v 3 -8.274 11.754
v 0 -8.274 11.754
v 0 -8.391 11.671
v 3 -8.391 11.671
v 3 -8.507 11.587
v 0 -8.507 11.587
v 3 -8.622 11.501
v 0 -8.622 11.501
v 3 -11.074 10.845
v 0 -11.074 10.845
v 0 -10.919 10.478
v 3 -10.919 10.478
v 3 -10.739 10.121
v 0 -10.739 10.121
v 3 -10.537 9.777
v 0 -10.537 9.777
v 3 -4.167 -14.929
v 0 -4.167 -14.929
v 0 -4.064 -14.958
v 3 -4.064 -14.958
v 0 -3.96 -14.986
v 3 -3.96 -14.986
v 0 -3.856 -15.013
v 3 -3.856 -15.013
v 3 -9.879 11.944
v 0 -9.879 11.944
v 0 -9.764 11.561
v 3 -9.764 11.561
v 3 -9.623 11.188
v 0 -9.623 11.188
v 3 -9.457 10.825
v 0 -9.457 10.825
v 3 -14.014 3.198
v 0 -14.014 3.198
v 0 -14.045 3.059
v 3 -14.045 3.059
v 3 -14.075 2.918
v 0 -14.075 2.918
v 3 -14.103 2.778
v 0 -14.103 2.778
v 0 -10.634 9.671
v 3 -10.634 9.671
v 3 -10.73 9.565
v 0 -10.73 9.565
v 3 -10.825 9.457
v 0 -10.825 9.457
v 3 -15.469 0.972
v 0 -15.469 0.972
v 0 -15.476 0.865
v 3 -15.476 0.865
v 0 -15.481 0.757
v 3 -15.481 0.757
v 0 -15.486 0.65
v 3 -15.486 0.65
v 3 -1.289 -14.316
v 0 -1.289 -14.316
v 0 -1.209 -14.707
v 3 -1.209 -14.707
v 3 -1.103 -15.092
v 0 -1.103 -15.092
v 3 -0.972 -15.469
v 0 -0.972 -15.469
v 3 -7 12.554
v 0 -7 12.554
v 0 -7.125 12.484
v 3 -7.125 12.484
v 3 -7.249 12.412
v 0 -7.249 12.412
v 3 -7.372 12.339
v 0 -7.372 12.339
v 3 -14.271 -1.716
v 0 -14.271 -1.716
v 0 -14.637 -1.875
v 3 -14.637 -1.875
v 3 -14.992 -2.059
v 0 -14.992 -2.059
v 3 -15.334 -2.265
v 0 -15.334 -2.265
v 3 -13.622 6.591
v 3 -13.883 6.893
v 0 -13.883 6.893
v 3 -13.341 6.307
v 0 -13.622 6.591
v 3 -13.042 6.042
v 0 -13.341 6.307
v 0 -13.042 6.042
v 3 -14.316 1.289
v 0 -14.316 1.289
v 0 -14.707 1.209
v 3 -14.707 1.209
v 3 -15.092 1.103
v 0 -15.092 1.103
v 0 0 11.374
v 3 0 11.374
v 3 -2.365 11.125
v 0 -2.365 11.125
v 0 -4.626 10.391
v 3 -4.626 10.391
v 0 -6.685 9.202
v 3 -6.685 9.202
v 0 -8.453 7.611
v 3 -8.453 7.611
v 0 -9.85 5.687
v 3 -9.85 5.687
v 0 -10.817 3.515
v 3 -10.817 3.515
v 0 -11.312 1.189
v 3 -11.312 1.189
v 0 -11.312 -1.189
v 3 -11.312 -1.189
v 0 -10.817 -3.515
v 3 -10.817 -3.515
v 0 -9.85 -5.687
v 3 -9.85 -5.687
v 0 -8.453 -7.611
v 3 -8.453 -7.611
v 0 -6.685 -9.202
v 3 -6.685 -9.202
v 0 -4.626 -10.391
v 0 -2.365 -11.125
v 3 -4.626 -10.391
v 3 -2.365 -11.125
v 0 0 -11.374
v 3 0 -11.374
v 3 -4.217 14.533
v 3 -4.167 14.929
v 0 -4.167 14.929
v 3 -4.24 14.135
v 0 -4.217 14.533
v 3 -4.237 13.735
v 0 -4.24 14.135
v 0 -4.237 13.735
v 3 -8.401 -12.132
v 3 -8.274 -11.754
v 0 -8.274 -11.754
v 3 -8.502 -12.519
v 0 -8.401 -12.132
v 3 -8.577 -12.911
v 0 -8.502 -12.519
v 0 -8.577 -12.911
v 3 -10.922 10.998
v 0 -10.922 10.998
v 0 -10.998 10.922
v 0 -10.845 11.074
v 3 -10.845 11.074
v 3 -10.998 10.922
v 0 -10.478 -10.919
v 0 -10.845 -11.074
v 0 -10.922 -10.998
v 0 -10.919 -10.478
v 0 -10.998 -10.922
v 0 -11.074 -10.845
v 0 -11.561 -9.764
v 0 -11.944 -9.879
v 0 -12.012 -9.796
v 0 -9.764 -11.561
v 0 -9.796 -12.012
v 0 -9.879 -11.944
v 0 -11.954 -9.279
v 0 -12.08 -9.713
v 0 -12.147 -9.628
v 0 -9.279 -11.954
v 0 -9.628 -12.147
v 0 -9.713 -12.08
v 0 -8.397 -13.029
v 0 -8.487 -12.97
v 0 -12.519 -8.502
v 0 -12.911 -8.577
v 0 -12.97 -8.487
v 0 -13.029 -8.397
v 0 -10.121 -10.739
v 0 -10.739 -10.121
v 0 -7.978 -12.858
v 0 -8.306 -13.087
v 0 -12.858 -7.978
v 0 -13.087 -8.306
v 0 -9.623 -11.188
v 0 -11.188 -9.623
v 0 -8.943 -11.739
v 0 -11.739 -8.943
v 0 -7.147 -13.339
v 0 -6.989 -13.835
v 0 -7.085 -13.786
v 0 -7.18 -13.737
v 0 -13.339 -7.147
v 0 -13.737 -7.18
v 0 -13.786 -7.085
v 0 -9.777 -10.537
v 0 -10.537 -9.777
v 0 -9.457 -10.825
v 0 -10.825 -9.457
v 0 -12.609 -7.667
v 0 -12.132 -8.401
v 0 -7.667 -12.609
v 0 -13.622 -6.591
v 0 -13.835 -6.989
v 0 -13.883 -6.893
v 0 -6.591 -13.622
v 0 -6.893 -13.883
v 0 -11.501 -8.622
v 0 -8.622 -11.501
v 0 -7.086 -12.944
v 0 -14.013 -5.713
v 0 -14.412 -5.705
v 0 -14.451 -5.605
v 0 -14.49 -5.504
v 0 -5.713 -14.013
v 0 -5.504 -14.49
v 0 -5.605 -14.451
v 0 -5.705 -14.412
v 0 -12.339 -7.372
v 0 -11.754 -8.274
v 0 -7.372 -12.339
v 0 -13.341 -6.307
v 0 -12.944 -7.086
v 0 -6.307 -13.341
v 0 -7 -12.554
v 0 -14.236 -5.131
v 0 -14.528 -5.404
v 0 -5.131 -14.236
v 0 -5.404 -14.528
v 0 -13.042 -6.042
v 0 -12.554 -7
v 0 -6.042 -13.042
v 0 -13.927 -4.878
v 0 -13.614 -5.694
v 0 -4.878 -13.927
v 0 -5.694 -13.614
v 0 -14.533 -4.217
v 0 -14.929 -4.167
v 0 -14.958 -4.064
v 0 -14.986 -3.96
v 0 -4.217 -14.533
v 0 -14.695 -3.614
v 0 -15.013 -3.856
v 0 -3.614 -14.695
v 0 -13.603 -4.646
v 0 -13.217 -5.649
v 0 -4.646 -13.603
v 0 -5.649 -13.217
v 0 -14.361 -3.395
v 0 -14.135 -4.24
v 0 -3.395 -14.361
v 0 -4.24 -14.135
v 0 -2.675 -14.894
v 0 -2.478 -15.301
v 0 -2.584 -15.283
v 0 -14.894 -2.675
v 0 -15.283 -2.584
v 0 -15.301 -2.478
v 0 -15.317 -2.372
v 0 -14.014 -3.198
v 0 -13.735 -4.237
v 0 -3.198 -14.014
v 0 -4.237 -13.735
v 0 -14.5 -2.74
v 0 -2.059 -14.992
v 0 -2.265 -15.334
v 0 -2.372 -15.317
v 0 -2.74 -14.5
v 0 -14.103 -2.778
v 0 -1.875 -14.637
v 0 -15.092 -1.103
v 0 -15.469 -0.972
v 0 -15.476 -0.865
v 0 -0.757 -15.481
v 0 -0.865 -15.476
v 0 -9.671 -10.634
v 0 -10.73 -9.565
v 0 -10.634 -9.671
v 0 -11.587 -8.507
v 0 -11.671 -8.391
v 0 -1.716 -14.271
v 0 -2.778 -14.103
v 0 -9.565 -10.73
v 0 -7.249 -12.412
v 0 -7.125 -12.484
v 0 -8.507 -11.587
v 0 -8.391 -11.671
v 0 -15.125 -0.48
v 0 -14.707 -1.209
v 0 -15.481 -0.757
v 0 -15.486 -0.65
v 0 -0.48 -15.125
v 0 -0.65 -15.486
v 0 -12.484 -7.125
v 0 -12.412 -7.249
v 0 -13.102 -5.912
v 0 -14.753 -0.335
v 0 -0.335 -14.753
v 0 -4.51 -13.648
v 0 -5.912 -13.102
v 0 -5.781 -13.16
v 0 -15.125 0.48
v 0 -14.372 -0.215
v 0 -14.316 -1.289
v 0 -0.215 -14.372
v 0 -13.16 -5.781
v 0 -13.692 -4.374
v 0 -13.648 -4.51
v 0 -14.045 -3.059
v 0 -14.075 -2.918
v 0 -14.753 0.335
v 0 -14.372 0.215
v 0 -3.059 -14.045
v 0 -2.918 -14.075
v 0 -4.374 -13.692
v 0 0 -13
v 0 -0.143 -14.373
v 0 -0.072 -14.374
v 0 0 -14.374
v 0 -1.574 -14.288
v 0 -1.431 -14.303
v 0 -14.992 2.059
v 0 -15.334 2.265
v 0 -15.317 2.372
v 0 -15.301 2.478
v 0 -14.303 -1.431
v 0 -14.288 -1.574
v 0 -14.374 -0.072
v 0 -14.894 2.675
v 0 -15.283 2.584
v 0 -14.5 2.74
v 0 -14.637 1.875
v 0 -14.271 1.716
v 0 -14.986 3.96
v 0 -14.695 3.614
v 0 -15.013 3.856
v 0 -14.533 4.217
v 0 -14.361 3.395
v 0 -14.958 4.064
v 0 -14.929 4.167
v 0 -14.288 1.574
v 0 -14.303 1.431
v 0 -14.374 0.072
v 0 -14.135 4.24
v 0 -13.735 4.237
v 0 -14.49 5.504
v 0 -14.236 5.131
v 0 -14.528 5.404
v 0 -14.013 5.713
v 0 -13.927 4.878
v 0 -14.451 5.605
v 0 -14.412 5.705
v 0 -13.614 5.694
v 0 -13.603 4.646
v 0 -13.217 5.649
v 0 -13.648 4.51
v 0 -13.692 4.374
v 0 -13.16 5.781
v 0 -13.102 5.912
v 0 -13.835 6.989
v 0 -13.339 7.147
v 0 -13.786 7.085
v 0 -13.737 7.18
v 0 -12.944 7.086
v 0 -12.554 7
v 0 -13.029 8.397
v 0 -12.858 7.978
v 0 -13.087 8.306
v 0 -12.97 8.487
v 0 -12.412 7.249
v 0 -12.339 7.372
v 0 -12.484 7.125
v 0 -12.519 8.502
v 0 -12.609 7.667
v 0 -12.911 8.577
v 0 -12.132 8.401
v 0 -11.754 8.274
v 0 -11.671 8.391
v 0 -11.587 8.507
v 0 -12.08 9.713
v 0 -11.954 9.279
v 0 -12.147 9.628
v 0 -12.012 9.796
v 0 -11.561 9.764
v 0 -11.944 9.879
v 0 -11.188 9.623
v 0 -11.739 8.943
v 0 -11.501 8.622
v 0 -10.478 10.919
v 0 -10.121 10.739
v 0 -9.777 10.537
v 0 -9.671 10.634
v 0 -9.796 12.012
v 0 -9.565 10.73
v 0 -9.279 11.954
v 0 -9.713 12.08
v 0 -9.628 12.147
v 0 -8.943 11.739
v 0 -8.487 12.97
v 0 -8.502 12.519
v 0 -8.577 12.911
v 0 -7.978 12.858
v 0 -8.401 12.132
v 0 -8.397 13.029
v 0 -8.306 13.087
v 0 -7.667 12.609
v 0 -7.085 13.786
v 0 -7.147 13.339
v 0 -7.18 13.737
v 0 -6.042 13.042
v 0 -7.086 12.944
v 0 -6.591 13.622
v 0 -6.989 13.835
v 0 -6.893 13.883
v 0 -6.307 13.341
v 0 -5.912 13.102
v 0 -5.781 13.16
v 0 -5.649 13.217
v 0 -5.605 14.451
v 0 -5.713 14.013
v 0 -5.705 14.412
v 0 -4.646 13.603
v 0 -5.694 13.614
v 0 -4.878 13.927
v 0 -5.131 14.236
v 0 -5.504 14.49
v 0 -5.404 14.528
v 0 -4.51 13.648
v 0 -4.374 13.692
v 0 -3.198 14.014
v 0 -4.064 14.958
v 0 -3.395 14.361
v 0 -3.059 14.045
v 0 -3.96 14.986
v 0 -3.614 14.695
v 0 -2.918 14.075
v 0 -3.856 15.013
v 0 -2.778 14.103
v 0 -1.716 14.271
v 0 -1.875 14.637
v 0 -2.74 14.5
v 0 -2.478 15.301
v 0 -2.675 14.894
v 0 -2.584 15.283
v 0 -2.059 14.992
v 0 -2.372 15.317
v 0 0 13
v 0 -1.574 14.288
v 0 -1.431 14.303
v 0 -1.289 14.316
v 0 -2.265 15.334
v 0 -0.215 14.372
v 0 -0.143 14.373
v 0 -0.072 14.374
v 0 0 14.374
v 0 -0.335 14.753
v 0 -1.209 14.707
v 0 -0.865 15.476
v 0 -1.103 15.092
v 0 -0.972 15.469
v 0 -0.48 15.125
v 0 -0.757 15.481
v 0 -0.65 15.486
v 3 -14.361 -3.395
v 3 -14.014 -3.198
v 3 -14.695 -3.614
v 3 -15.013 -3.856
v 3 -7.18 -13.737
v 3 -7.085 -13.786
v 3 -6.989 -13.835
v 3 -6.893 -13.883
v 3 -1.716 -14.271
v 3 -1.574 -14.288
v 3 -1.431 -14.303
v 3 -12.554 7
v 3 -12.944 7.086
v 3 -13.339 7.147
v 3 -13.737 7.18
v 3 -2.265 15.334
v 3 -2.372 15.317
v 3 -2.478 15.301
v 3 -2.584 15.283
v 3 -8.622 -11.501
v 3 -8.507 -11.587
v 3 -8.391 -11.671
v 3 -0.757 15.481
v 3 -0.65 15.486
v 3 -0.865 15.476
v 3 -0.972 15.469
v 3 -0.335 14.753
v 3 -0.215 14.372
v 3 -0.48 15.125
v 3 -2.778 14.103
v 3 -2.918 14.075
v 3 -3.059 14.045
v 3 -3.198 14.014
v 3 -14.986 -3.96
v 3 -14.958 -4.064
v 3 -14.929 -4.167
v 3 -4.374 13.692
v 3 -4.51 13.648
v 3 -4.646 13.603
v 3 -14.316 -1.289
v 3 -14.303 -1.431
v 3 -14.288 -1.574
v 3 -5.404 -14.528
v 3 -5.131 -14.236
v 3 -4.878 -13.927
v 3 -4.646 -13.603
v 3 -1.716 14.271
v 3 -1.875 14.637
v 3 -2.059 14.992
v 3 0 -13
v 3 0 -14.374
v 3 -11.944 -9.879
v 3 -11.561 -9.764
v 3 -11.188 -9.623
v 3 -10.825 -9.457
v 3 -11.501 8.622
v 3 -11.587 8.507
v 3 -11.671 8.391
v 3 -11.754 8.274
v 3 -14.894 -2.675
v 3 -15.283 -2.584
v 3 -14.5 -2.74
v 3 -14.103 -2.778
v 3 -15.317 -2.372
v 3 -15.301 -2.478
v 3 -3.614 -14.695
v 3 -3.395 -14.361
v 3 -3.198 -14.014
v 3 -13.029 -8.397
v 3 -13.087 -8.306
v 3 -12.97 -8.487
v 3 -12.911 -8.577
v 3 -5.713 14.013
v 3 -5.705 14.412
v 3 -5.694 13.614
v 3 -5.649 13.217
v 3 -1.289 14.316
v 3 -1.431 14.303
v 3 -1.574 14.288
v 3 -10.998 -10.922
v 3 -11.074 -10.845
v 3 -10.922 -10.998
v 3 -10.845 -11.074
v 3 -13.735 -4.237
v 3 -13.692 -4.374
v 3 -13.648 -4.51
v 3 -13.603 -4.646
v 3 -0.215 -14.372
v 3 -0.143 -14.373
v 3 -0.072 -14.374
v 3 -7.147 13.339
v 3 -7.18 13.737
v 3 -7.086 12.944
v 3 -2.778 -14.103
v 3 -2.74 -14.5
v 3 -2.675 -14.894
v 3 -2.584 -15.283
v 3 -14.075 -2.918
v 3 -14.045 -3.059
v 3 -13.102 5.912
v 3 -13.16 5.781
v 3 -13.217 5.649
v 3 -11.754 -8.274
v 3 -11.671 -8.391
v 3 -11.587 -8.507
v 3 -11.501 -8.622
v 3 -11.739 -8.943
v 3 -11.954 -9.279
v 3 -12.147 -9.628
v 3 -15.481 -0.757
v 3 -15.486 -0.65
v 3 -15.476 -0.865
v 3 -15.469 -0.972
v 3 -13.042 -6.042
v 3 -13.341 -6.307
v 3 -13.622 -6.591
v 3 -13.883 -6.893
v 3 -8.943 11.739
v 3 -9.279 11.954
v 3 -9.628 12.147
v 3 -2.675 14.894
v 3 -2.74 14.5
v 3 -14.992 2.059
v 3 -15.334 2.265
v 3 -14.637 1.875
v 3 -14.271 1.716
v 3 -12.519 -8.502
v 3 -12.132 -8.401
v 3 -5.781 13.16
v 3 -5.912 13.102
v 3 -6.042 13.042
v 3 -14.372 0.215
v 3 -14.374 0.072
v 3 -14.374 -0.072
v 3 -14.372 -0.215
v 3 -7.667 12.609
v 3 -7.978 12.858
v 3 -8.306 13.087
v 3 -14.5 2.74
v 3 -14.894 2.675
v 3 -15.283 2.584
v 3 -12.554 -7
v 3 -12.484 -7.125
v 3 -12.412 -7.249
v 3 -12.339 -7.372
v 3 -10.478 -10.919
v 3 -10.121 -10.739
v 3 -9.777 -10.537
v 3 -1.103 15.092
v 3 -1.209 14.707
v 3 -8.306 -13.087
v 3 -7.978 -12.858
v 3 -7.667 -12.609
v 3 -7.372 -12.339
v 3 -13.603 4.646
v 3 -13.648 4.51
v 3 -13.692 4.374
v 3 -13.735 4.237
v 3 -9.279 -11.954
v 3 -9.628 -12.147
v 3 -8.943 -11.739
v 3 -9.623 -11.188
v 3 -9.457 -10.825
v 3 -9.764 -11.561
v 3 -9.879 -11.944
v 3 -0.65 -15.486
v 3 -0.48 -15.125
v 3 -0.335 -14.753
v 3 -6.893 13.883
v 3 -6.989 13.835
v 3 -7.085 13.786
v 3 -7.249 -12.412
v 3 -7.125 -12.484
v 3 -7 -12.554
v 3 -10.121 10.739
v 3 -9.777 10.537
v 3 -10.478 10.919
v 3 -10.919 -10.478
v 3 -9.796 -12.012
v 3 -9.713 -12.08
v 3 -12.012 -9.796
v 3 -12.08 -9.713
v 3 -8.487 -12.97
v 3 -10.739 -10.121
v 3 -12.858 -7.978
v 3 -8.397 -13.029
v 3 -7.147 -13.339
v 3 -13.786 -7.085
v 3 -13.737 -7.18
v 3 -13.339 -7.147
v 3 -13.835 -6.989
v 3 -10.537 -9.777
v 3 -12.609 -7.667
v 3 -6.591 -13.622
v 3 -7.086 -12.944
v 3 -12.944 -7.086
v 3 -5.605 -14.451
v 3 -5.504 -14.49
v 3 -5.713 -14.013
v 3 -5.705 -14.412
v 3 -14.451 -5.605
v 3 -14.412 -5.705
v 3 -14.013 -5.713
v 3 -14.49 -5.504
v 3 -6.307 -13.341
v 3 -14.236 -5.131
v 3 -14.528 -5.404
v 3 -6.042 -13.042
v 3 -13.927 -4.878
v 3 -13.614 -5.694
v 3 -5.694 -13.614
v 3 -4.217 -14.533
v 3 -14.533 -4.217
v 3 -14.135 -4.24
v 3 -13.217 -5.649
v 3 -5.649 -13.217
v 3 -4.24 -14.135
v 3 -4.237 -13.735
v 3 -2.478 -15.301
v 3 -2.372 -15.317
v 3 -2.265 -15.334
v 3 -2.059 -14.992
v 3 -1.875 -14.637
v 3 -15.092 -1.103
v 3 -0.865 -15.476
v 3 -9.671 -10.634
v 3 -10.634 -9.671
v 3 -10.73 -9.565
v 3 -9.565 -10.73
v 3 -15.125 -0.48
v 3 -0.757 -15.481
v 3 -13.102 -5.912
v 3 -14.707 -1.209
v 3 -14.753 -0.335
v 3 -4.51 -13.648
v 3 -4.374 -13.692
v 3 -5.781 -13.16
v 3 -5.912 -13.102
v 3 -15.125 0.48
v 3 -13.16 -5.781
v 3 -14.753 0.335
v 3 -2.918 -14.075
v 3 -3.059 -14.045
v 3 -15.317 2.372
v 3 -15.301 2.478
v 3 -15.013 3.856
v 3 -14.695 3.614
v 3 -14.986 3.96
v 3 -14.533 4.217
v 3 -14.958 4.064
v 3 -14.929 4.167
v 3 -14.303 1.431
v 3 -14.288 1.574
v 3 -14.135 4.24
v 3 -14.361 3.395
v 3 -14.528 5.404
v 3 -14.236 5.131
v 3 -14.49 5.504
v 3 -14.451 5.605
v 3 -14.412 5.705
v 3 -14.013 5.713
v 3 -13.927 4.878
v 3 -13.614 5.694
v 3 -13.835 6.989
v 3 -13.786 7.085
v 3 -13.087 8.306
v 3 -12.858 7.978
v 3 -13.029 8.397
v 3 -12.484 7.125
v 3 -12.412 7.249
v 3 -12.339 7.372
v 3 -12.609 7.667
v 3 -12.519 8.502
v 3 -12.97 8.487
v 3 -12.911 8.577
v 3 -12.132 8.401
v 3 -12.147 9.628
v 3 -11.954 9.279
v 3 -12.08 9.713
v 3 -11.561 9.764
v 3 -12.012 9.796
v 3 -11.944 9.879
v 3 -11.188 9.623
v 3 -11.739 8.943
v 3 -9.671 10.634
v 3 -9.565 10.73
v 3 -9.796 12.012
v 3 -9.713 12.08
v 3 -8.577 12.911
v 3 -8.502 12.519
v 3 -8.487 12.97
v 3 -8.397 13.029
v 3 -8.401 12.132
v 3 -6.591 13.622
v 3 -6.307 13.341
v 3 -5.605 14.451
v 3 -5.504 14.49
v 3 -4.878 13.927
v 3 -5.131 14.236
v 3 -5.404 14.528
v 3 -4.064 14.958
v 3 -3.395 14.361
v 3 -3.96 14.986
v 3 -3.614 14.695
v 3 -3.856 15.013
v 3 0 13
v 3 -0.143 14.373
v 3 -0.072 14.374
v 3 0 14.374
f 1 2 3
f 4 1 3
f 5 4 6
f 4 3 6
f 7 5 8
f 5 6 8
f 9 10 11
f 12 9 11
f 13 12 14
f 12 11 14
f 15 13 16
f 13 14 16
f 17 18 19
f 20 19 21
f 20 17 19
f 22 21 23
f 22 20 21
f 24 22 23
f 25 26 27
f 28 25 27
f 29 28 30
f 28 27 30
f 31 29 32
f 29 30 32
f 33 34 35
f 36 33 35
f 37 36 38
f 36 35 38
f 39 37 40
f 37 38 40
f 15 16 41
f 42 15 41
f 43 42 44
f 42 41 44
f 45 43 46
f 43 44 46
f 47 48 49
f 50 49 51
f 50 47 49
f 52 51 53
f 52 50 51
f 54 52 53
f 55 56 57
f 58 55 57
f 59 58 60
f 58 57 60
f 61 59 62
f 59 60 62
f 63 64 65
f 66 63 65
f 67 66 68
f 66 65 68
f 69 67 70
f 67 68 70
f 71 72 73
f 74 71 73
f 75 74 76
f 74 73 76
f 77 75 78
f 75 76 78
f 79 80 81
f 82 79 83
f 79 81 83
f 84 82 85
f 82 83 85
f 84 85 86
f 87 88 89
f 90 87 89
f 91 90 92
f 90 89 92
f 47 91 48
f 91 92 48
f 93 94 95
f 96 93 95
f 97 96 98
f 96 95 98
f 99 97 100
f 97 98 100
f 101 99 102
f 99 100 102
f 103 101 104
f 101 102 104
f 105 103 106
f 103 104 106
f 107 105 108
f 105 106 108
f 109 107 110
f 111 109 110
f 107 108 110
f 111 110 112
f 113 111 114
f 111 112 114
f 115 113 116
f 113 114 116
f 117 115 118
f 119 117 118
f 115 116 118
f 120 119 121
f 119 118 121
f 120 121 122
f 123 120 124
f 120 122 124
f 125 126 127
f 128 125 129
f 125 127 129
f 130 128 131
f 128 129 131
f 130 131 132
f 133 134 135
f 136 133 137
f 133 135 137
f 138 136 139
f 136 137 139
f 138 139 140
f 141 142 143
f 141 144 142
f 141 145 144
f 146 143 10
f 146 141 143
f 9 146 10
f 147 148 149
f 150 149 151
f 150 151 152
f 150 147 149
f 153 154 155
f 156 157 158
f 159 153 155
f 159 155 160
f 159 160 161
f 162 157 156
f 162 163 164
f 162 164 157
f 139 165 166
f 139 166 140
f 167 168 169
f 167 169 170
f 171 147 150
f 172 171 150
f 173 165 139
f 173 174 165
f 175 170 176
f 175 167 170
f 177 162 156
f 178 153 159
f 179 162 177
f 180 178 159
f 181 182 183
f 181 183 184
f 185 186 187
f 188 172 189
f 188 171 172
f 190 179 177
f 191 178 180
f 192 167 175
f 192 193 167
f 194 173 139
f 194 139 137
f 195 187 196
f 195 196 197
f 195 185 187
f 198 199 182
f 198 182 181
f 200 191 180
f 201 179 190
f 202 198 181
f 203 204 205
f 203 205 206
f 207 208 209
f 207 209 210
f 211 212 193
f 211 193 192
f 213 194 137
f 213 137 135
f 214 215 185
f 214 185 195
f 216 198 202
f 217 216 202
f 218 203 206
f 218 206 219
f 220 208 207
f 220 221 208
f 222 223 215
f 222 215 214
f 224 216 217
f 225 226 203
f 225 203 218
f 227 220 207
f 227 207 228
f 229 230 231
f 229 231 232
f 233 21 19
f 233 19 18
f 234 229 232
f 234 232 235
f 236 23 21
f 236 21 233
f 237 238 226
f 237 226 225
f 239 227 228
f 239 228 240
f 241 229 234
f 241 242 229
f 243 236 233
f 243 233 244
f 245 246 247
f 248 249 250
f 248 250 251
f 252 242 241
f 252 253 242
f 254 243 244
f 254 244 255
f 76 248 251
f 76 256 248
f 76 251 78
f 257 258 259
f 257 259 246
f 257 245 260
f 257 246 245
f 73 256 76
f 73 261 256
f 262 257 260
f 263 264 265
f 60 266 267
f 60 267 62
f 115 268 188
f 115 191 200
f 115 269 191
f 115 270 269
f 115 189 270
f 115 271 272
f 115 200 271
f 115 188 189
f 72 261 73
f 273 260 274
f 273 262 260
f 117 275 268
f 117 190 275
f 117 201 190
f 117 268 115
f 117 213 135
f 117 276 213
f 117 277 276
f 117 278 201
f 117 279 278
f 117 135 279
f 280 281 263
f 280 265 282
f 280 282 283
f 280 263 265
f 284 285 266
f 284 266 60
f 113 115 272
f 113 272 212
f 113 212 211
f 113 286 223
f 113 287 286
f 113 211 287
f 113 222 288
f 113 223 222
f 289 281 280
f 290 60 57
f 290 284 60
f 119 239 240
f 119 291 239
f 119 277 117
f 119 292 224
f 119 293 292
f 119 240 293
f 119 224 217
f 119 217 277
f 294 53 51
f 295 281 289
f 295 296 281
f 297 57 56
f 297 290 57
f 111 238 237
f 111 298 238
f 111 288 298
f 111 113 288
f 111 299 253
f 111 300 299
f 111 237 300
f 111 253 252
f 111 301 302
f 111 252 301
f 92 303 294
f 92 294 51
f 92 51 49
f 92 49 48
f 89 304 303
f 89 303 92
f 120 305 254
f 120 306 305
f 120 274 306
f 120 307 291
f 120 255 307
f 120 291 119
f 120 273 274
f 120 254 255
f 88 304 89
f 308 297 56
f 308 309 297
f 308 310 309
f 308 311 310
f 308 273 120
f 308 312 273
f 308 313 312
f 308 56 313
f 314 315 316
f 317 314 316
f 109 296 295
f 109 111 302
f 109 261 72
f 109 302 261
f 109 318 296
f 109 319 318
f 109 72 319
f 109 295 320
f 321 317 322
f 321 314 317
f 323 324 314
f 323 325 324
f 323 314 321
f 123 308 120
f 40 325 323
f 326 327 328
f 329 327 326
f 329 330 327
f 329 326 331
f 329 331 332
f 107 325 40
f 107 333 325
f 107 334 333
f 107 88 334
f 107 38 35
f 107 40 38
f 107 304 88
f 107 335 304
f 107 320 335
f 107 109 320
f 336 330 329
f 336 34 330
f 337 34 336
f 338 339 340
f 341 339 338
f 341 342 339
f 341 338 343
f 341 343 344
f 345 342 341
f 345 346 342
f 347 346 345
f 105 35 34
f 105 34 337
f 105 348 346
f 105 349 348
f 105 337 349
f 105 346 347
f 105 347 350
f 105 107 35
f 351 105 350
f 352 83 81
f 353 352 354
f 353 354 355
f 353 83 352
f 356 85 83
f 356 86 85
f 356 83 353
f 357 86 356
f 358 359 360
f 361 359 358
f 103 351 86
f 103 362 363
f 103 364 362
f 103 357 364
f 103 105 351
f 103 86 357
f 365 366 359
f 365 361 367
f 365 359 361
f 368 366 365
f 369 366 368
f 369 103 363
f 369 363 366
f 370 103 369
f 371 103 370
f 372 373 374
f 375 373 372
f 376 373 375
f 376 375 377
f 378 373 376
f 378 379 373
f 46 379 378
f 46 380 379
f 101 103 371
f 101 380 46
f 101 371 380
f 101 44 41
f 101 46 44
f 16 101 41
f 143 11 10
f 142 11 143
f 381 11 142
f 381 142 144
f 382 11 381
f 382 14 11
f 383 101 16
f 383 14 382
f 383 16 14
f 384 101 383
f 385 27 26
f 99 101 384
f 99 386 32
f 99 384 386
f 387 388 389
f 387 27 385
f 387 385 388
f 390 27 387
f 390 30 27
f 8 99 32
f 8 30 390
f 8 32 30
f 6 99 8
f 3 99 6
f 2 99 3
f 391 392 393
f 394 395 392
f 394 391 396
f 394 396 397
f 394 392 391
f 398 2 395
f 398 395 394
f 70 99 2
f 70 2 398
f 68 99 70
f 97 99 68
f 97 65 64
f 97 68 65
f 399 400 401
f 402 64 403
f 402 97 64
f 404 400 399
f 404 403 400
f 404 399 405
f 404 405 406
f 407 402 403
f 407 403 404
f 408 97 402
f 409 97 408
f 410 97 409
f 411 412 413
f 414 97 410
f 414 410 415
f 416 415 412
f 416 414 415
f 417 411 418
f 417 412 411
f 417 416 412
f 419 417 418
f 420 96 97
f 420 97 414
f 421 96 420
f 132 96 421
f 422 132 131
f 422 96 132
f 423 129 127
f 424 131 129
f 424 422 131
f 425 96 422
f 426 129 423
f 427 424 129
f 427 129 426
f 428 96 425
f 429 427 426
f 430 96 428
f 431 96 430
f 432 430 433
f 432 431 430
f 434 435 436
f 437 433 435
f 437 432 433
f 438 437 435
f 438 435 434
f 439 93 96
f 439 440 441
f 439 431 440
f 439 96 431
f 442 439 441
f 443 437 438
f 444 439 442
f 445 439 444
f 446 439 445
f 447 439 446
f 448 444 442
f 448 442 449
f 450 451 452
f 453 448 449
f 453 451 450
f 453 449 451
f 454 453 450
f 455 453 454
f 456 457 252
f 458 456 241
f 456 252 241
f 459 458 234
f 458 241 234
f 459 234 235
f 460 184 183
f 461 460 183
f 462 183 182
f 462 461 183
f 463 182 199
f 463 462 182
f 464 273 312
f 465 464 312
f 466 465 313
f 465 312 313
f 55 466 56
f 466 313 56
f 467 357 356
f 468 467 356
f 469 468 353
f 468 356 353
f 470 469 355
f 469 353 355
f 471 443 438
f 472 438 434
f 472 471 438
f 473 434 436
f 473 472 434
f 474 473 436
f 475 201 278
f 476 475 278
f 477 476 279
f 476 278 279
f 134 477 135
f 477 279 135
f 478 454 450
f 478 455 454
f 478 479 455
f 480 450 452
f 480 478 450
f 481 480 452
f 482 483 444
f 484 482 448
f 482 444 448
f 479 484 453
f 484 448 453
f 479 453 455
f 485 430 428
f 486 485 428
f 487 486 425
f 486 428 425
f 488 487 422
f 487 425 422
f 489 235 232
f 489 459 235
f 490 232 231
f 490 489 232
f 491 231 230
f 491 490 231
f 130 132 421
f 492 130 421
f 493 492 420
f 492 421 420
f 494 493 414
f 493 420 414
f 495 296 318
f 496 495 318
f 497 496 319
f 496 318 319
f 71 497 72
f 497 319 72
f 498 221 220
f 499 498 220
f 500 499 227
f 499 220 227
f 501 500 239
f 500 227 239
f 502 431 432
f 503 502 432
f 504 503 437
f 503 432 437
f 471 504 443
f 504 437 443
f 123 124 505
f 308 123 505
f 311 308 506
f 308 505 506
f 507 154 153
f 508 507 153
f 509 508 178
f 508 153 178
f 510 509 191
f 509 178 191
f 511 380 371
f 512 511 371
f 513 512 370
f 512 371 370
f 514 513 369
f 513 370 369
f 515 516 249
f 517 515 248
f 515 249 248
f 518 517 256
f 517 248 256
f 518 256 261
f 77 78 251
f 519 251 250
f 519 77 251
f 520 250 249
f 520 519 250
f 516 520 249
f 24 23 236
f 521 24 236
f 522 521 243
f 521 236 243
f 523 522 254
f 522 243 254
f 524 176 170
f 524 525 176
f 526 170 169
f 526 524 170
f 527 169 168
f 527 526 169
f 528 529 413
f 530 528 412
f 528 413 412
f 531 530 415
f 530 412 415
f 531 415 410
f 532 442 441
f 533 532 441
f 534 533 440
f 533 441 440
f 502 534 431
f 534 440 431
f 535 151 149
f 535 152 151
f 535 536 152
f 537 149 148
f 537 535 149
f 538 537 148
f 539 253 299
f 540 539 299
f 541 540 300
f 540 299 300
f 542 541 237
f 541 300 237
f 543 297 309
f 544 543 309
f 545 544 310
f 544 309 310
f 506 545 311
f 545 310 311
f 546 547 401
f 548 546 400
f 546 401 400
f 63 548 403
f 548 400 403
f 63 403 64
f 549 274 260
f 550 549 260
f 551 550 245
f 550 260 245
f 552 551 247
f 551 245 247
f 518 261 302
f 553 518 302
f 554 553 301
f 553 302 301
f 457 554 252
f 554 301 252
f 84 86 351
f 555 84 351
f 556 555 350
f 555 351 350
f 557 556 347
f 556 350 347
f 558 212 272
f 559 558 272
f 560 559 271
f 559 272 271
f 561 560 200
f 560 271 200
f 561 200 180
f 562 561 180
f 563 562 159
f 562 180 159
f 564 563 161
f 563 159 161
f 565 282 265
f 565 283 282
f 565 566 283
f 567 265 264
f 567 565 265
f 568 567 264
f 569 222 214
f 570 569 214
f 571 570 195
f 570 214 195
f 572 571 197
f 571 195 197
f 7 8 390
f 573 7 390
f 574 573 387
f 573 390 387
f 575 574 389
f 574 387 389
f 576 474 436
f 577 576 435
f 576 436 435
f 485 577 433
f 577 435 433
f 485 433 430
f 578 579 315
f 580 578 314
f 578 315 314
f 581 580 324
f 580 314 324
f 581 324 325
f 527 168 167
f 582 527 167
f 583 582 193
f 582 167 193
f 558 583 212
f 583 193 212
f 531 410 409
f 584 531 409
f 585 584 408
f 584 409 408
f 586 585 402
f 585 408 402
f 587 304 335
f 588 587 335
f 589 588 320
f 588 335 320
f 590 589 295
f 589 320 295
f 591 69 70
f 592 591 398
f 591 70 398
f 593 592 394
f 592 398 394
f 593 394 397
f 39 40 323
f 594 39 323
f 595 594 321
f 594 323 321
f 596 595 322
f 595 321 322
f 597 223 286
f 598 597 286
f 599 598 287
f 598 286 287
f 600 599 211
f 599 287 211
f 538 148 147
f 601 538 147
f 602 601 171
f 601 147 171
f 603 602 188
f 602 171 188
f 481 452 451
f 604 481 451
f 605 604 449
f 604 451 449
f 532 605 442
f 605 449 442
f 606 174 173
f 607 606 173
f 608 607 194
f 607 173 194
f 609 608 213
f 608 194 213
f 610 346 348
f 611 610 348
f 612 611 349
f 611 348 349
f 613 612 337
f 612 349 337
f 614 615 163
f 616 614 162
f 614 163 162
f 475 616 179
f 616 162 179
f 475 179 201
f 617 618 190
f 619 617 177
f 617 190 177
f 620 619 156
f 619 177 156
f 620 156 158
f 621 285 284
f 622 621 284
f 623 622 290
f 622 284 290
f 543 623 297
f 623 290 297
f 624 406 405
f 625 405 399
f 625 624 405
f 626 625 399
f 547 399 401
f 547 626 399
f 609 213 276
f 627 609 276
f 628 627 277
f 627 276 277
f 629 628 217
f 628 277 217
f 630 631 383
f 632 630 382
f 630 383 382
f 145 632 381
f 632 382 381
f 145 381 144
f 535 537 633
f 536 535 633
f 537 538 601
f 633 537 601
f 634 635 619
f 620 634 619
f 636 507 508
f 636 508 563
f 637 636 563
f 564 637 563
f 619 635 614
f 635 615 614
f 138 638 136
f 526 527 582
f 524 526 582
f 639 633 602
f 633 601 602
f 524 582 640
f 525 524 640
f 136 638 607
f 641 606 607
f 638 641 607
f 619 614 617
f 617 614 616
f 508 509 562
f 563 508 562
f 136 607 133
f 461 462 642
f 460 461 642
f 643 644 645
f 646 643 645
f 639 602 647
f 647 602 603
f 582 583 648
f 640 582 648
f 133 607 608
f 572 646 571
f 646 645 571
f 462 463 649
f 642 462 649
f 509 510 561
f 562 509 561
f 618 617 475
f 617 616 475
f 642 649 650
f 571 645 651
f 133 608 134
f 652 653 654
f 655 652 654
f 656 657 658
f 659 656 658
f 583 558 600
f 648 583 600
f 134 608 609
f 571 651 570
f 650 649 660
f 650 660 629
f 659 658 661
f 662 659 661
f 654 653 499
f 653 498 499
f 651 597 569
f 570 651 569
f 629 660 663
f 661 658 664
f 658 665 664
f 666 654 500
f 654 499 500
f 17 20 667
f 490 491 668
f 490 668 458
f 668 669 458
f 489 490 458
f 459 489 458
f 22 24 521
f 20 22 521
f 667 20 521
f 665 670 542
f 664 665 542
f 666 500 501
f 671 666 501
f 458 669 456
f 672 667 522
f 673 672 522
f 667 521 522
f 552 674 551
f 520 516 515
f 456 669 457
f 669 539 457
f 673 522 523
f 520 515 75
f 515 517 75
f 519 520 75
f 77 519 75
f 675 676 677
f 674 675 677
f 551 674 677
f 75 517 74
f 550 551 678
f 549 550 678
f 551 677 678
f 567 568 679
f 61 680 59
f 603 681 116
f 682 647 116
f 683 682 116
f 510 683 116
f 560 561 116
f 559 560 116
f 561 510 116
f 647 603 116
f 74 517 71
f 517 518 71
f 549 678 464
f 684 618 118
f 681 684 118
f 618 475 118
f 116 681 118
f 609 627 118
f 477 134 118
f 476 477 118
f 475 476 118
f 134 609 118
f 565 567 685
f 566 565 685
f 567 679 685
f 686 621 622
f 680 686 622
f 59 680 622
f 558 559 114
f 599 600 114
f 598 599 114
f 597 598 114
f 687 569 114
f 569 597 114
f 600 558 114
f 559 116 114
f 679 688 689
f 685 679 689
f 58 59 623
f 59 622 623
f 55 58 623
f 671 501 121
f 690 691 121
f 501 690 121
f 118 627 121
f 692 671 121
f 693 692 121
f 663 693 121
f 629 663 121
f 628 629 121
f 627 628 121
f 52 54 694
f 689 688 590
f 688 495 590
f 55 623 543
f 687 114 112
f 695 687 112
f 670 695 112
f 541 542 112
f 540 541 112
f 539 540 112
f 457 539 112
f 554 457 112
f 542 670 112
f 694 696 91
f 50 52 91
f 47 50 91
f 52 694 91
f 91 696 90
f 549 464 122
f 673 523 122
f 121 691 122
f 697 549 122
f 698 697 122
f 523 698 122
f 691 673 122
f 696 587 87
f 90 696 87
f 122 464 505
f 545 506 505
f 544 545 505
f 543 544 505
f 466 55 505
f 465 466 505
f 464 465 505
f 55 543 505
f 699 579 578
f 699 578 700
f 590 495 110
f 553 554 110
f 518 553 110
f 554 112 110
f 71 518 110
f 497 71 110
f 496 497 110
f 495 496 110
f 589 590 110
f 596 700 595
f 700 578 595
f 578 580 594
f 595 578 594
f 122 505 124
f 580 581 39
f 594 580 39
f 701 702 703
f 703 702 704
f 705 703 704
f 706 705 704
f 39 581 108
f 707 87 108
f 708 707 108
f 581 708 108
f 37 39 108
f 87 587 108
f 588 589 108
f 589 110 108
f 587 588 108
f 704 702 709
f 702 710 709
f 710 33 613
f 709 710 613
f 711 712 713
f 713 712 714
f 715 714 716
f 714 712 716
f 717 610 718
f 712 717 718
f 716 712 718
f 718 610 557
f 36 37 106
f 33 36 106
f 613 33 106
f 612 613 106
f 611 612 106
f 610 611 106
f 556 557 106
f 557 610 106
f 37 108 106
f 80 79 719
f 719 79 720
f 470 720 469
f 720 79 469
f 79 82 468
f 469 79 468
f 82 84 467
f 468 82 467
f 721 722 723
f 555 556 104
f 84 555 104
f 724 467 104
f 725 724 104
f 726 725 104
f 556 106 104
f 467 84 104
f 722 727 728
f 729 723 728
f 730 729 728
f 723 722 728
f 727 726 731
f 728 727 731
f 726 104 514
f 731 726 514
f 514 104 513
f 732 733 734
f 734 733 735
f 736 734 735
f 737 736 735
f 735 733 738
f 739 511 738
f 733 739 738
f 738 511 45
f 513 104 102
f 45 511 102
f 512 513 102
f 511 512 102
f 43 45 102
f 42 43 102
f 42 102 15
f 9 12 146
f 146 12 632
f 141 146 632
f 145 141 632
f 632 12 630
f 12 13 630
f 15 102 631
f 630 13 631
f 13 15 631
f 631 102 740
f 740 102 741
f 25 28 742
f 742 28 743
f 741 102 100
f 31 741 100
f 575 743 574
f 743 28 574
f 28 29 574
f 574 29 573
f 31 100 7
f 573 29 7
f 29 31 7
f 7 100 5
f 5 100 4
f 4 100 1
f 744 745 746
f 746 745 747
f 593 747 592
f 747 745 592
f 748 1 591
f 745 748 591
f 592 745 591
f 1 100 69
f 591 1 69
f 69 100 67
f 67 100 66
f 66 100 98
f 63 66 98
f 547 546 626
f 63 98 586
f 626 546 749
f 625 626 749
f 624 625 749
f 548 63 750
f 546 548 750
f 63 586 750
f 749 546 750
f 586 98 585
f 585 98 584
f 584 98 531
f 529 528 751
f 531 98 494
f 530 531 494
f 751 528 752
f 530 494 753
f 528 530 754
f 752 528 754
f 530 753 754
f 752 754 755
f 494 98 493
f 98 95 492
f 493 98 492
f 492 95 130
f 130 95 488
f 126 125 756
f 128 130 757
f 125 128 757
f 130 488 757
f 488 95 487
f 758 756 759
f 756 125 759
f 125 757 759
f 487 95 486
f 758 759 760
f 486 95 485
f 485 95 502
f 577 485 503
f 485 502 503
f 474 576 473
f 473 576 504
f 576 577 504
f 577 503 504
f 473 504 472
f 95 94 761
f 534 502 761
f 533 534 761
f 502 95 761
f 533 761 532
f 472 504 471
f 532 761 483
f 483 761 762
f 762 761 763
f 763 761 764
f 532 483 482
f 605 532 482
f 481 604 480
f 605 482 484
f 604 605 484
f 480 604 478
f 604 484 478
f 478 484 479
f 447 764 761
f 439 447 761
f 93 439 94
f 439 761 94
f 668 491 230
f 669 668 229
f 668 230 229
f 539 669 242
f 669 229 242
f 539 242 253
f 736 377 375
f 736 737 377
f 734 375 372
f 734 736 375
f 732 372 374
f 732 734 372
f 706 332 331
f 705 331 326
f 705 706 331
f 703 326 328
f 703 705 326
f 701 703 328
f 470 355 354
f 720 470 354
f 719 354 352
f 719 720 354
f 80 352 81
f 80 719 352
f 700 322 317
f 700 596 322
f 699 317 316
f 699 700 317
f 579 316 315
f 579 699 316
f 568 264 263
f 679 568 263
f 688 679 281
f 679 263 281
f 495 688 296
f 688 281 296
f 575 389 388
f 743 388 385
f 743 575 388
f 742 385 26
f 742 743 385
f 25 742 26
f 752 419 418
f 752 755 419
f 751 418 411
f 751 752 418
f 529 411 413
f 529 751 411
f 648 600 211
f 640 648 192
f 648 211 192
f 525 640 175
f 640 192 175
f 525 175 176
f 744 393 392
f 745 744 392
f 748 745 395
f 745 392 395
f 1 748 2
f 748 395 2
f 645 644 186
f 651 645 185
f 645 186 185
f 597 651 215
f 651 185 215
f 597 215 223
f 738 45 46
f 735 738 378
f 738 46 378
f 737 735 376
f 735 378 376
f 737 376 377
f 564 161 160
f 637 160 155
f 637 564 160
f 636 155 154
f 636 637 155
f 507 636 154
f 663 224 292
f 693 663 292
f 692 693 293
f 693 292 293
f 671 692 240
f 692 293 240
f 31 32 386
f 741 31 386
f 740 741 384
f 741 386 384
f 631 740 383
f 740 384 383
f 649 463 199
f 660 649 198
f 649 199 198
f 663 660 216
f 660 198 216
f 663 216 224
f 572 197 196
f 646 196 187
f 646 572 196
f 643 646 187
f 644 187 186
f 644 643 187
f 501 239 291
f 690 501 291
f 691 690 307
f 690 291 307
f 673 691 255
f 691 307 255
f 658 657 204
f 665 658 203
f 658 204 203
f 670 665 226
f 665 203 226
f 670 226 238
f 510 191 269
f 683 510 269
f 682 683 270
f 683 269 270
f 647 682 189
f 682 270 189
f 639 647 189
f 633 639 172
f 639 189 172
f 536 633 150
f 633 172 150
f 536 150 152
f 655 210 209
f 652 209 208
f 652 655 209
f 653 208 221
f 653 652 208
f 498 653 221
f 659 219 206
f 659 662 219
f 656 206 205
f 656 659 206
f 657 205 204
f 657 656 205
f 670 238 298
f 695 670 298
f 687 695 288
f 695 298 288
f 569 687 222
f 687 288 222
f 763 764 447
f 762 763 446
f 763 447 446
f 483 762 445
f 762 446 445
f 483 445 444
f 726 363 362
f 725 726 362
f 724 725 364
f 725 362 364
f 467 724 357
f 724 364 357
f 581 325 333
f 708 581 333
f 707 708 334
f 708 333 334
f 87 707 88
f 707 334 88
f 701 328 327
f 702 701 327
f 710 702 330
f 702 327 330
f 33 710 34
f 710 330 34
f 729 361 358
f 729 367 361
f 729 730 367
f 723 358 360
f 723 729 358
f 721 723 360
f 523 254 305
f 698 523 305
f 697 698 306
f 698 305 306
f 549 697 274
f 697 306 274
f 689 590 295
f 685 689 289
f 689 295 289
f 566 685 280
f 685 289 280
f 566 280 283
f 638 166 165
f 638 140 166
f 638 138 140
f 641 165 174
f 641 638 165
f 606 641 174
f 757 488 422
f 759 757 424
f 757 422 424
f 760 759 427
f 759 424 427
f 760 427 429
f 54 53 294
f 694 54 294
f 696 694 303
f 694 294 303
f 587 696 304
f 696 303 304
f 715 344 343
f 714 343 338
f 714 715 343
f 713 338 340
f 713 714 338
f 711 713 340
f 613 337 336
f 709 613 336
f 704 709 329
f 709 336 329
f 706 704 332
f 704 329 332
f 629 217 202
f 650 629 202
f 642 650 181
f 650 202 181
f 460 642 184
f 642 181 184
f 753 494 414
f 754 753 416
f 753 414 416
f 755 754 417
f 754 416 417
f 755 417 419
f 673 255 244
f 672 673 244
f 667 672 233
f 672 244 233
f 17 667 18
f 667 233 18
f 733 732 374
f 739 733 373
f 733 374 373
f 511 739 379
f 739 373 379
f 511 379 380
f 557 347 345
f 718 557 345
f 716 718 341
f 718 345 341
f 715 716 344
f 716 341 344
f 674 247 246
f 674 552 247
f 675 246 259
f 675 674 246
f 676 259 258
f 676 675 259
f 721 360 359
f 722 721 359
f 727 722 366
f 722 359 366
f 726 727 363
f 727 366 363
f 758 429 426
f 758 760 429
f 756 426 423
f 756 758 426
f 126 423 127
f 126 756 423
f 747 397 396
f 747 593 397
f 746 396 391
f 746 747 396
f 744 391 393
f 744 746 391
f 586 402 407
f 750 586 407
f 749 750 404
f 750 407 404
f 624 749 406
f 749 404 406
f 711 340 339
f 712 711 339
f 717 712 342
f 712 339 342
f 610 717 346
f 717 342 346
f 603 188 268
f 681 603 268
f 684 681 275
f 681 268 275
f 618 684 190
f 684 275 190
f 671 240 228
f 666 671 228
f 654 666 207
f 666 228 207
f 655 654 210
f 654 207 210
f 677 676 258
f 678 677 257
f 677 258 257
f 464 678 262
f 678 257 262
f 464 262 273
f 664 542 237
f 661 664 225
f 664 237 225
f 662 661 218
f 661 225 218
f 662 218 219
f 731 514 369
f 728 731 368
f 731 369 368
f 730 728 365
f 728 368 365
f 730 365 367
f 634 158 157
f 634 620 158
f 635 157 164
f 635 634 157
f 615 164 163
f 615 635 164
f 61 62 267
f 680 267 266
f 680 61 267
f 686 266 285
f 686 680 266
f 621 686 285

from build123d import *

# Parameters (mm, degrees)
BASPROSKE_W             = 3
BASPROSKE_H             = 15.5
TOOTHCUT_DEPTH          = 23.12464689
TEETHCUTS_COUNT         = 60
TEETHCUTS_ANGLE         = 354
BORSKE_R                = 13
BORE_DEPTH              = 50.0000508
CROQUIS1_W              = 35.088386171
CROQUIS1_H              = 16.253421715
CORTAR_EXTRUIR1_DEPTH   = 23.10554405
SALIENTE_EXTRUIR1_DEPTH = 3


with BuildPart() as part:
    # BasProSke → Base-Revolve (revolve)
    with BuildSketch(Plane(origin=(0, 0, 0), x_dir=(1, 0, 0), z_dir=(0, 1, 0)), mode=Mode.PRIVATE) as base_revolve_sk:
        with Locations((1.5, 7.75)):
            Rectangle(BASPROSKE_W, BASPROSKE_H)
    revolve(base_revolve_sk.sketch.rotate(Axis((-10, 0, 0), (1, 0, 0)), 180), axis=Axis((-10, 0, 0), (1, 0, 0)))

    # TooCutSke → ToothCut (cut, through all)
    with BuildSketch(Plane(origin=(0, 0, 0), x_dir=(0, 0, -1), z_dir=(1, 0, 0))):
        with BuildLine():
            ThreePointArc((0.21493681, 14.372392917), (0, 14.374), (-0.21493681, 14.372392917))
            ThreePointArc((-0.21493681, 14.372392917), (-0.409732631, 14.953266942), (-0.662749221, 15.51124781))
            ThreePointArc((-0.662749221, 15.51124781), (0, 15.5254), (0.662749221, 15.51124781))
            ThreePointArc((0.662749221, 15.51124781), (0.409732631, 14.953266942), (0.21493681, 14.372392917))
        make_face()
    toothcut = extrude(amount=TOOTHCUT_DEPTH, mode=Mode.SUBTRACT)

    # TeethCuts: ToothCut ×60 about axis
    teethcuts_axis = Axis((-10, 0, 0), (1, 0, 0))
    for i in range(1, TEETHCUTS_COUNT):
        add(toothcut.rotate(teethcuts_axis, i * TEETHCUTS_ANGLE / (TEETHCUTS_COUNT - 1)), mode=Mode.SUBTRACT)

    # BorSke → Bore (cut, symmetric)
    with BuildSketch(Plane(origin=(0, 0, 0), x_dir=(0, 0, -1), z_dir=(1, 0, 0))):
        with Locations(Location((0, 0, 0), (0, 0, 180))):
            Circle(BORSKE_R)
    extrude(amount=BORE_DEPTH, both=True, mode=Mode.SUBTRACT)

    # Croquis1 → Cortar-Extruir1 (cut, through all)
    with BuildSketch(Plane(origin=(3, 0, 0), x_dir=(0, 0, -1), z_dir=(1, 0, 0))):
        with Locations((0.283547397, 8.126710858)):
            Rectangle(CROQUIS1_W, CROQUIS1_H)
    extrude(amount=-CORTAR_EXTRUIR1_DEPTH, mode=Mode.SUBTRACT)

    # Croquis2 → Saliente-Extruir1 (add, through all)
    with BuildSketch(Plane(origin=(3, 0, 0), x_dir=(0, 0, -1), z_dir=(1, 0, 0))):
        with BuildLine():
            Line((-13, 0), (-11.374, 0))
            ThreePointArc((-11.374, 0), (0, -11.374), (11.374, 0))
            Line((11.374, 0), (13, 0))
            ThreePointArc((13, 0), (0, -13), (-13, 0))
        make_face()
    extrude(amount=-SALIENTE_EXTRUIR1_DEPTH)


solid = part.part
